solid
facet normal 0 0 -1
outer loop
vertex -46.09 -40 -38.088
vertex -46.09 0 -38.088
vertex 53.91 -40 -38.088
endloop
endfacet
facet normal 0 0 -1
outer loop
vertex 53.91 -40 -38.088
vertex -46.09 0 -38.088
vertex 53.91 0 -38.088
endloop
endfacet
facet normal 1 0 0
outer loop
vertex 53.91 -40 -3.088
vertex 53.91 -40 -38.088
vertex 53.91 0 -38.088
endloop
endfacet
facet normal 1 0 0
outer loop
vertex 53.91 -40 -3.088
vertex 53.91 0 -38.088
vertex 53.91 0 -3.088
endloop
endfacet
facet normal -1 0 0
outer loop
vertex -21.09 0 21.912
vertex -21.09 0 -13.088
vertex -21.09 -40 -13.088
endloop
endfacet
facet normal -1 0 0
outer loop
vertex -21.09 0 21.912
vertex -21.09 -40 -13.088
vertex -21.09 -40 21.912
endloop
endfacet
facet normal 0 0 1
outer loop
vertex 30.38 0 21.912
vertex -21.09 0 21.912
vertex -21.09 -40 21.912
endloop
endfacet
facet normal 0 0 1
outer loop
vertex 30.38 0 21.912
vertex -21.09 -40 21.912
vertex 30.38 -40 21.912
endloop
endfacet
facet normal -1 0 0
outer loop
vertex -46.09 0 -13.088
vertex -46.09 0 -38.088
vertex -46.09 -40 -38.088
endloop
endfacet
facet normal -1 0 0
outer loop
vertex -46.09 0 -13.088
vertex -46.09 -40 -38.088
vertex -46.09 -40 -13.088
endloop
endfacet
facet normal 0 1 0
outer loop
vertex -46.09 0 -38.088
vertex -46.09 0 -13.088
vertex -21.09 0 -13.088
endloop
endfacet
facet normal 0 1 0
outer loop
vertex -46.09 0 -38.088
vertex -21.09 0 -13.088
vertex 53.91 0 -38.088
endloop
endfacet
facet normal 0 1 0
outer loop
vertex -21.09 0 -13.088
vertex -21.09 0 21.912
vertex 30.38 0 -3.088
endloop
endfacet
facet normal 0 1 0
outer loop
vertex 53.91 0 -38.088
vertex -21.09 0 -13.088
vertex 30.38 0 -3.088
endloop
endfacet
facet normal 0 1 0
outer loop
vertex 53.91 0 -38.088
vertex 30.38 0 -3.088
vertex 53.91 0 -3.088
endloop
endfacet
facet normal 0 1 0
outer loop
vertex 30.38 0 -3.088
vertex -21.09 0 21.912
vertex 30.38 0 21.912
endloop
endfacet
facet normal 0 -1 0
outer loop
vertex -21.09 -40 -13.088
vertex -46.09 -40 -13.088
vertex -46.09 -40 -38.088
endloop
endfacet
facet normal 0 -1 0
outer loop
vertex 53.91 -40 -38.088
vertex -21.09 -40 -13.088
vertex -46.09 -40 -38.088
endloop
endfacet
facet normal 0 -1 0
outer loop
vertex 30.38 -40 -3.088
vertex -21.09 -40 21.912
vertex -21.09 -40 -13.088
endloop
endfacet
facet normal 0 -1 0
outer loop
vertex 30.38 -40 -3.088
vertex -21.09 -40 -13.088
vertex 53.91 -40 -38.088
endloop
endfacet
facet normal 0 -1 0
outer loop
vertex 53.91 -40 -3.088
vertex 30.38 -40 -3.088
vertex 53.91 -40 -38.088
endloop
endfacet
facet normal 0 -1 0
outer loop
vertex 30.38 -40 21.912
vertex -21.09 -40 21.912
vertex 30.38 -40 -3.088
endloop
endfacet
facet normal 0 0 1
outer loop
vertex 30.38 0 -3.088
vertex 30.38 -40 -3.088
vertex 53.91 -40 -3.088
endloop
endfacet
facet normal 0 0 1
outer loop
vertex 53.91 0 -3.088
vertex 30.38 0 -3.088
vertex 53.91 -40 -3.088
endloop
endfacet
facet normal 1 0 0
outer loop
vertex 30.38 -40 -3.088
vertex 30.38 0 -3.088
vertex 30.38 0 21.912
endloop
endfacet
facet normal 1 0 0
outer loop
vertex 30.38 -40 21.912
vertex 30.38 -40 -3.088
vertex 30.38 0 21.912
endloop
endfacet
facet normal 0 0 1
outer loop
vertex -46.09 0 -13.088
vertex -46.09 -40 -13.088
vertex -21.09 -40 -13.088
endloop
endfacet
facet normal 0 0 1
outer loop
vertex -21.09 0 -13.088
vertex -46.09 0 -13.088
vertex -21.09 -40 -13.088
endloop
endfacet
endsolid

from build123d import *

# Parameters (mm, degrees)
F0_W     = 100.000054
F0_H     = 59.99988
F1_DEPTH = 39.99992
F2_W     = 23.5305579296
F2_H     = 25.0000008
F2_W_2   = 25.0000008
F2_H_2   = 34.99993
F3_DEPTH = 40.00092


with BuildPart() as f1:
    # F0 (on Front) → F1 (new body)
    with BuildSketch(Plane.XZ):
        with Locations((3.9102658629, -8.0880385926)):
            Rectangle(F0_W, F0_H)
    extrude(amount=F1_DEPTH)

    # F2 (on face) → F3 (cut, through all)
    with BuildSketch(Plane.XZ.offset(39.99992)):
        with Locations((42.1450138982, 9.4119010074)):
            Rectangle(F2_W, F2_H)
        with Locations((-33.5897607371, 4.4119364074)):
            Rectangle(F2_W_2, F2_H_2)
    extrude(amount=-F3_DEPTH, mode=Mode.SUBTRACT)


solid = f1.part
